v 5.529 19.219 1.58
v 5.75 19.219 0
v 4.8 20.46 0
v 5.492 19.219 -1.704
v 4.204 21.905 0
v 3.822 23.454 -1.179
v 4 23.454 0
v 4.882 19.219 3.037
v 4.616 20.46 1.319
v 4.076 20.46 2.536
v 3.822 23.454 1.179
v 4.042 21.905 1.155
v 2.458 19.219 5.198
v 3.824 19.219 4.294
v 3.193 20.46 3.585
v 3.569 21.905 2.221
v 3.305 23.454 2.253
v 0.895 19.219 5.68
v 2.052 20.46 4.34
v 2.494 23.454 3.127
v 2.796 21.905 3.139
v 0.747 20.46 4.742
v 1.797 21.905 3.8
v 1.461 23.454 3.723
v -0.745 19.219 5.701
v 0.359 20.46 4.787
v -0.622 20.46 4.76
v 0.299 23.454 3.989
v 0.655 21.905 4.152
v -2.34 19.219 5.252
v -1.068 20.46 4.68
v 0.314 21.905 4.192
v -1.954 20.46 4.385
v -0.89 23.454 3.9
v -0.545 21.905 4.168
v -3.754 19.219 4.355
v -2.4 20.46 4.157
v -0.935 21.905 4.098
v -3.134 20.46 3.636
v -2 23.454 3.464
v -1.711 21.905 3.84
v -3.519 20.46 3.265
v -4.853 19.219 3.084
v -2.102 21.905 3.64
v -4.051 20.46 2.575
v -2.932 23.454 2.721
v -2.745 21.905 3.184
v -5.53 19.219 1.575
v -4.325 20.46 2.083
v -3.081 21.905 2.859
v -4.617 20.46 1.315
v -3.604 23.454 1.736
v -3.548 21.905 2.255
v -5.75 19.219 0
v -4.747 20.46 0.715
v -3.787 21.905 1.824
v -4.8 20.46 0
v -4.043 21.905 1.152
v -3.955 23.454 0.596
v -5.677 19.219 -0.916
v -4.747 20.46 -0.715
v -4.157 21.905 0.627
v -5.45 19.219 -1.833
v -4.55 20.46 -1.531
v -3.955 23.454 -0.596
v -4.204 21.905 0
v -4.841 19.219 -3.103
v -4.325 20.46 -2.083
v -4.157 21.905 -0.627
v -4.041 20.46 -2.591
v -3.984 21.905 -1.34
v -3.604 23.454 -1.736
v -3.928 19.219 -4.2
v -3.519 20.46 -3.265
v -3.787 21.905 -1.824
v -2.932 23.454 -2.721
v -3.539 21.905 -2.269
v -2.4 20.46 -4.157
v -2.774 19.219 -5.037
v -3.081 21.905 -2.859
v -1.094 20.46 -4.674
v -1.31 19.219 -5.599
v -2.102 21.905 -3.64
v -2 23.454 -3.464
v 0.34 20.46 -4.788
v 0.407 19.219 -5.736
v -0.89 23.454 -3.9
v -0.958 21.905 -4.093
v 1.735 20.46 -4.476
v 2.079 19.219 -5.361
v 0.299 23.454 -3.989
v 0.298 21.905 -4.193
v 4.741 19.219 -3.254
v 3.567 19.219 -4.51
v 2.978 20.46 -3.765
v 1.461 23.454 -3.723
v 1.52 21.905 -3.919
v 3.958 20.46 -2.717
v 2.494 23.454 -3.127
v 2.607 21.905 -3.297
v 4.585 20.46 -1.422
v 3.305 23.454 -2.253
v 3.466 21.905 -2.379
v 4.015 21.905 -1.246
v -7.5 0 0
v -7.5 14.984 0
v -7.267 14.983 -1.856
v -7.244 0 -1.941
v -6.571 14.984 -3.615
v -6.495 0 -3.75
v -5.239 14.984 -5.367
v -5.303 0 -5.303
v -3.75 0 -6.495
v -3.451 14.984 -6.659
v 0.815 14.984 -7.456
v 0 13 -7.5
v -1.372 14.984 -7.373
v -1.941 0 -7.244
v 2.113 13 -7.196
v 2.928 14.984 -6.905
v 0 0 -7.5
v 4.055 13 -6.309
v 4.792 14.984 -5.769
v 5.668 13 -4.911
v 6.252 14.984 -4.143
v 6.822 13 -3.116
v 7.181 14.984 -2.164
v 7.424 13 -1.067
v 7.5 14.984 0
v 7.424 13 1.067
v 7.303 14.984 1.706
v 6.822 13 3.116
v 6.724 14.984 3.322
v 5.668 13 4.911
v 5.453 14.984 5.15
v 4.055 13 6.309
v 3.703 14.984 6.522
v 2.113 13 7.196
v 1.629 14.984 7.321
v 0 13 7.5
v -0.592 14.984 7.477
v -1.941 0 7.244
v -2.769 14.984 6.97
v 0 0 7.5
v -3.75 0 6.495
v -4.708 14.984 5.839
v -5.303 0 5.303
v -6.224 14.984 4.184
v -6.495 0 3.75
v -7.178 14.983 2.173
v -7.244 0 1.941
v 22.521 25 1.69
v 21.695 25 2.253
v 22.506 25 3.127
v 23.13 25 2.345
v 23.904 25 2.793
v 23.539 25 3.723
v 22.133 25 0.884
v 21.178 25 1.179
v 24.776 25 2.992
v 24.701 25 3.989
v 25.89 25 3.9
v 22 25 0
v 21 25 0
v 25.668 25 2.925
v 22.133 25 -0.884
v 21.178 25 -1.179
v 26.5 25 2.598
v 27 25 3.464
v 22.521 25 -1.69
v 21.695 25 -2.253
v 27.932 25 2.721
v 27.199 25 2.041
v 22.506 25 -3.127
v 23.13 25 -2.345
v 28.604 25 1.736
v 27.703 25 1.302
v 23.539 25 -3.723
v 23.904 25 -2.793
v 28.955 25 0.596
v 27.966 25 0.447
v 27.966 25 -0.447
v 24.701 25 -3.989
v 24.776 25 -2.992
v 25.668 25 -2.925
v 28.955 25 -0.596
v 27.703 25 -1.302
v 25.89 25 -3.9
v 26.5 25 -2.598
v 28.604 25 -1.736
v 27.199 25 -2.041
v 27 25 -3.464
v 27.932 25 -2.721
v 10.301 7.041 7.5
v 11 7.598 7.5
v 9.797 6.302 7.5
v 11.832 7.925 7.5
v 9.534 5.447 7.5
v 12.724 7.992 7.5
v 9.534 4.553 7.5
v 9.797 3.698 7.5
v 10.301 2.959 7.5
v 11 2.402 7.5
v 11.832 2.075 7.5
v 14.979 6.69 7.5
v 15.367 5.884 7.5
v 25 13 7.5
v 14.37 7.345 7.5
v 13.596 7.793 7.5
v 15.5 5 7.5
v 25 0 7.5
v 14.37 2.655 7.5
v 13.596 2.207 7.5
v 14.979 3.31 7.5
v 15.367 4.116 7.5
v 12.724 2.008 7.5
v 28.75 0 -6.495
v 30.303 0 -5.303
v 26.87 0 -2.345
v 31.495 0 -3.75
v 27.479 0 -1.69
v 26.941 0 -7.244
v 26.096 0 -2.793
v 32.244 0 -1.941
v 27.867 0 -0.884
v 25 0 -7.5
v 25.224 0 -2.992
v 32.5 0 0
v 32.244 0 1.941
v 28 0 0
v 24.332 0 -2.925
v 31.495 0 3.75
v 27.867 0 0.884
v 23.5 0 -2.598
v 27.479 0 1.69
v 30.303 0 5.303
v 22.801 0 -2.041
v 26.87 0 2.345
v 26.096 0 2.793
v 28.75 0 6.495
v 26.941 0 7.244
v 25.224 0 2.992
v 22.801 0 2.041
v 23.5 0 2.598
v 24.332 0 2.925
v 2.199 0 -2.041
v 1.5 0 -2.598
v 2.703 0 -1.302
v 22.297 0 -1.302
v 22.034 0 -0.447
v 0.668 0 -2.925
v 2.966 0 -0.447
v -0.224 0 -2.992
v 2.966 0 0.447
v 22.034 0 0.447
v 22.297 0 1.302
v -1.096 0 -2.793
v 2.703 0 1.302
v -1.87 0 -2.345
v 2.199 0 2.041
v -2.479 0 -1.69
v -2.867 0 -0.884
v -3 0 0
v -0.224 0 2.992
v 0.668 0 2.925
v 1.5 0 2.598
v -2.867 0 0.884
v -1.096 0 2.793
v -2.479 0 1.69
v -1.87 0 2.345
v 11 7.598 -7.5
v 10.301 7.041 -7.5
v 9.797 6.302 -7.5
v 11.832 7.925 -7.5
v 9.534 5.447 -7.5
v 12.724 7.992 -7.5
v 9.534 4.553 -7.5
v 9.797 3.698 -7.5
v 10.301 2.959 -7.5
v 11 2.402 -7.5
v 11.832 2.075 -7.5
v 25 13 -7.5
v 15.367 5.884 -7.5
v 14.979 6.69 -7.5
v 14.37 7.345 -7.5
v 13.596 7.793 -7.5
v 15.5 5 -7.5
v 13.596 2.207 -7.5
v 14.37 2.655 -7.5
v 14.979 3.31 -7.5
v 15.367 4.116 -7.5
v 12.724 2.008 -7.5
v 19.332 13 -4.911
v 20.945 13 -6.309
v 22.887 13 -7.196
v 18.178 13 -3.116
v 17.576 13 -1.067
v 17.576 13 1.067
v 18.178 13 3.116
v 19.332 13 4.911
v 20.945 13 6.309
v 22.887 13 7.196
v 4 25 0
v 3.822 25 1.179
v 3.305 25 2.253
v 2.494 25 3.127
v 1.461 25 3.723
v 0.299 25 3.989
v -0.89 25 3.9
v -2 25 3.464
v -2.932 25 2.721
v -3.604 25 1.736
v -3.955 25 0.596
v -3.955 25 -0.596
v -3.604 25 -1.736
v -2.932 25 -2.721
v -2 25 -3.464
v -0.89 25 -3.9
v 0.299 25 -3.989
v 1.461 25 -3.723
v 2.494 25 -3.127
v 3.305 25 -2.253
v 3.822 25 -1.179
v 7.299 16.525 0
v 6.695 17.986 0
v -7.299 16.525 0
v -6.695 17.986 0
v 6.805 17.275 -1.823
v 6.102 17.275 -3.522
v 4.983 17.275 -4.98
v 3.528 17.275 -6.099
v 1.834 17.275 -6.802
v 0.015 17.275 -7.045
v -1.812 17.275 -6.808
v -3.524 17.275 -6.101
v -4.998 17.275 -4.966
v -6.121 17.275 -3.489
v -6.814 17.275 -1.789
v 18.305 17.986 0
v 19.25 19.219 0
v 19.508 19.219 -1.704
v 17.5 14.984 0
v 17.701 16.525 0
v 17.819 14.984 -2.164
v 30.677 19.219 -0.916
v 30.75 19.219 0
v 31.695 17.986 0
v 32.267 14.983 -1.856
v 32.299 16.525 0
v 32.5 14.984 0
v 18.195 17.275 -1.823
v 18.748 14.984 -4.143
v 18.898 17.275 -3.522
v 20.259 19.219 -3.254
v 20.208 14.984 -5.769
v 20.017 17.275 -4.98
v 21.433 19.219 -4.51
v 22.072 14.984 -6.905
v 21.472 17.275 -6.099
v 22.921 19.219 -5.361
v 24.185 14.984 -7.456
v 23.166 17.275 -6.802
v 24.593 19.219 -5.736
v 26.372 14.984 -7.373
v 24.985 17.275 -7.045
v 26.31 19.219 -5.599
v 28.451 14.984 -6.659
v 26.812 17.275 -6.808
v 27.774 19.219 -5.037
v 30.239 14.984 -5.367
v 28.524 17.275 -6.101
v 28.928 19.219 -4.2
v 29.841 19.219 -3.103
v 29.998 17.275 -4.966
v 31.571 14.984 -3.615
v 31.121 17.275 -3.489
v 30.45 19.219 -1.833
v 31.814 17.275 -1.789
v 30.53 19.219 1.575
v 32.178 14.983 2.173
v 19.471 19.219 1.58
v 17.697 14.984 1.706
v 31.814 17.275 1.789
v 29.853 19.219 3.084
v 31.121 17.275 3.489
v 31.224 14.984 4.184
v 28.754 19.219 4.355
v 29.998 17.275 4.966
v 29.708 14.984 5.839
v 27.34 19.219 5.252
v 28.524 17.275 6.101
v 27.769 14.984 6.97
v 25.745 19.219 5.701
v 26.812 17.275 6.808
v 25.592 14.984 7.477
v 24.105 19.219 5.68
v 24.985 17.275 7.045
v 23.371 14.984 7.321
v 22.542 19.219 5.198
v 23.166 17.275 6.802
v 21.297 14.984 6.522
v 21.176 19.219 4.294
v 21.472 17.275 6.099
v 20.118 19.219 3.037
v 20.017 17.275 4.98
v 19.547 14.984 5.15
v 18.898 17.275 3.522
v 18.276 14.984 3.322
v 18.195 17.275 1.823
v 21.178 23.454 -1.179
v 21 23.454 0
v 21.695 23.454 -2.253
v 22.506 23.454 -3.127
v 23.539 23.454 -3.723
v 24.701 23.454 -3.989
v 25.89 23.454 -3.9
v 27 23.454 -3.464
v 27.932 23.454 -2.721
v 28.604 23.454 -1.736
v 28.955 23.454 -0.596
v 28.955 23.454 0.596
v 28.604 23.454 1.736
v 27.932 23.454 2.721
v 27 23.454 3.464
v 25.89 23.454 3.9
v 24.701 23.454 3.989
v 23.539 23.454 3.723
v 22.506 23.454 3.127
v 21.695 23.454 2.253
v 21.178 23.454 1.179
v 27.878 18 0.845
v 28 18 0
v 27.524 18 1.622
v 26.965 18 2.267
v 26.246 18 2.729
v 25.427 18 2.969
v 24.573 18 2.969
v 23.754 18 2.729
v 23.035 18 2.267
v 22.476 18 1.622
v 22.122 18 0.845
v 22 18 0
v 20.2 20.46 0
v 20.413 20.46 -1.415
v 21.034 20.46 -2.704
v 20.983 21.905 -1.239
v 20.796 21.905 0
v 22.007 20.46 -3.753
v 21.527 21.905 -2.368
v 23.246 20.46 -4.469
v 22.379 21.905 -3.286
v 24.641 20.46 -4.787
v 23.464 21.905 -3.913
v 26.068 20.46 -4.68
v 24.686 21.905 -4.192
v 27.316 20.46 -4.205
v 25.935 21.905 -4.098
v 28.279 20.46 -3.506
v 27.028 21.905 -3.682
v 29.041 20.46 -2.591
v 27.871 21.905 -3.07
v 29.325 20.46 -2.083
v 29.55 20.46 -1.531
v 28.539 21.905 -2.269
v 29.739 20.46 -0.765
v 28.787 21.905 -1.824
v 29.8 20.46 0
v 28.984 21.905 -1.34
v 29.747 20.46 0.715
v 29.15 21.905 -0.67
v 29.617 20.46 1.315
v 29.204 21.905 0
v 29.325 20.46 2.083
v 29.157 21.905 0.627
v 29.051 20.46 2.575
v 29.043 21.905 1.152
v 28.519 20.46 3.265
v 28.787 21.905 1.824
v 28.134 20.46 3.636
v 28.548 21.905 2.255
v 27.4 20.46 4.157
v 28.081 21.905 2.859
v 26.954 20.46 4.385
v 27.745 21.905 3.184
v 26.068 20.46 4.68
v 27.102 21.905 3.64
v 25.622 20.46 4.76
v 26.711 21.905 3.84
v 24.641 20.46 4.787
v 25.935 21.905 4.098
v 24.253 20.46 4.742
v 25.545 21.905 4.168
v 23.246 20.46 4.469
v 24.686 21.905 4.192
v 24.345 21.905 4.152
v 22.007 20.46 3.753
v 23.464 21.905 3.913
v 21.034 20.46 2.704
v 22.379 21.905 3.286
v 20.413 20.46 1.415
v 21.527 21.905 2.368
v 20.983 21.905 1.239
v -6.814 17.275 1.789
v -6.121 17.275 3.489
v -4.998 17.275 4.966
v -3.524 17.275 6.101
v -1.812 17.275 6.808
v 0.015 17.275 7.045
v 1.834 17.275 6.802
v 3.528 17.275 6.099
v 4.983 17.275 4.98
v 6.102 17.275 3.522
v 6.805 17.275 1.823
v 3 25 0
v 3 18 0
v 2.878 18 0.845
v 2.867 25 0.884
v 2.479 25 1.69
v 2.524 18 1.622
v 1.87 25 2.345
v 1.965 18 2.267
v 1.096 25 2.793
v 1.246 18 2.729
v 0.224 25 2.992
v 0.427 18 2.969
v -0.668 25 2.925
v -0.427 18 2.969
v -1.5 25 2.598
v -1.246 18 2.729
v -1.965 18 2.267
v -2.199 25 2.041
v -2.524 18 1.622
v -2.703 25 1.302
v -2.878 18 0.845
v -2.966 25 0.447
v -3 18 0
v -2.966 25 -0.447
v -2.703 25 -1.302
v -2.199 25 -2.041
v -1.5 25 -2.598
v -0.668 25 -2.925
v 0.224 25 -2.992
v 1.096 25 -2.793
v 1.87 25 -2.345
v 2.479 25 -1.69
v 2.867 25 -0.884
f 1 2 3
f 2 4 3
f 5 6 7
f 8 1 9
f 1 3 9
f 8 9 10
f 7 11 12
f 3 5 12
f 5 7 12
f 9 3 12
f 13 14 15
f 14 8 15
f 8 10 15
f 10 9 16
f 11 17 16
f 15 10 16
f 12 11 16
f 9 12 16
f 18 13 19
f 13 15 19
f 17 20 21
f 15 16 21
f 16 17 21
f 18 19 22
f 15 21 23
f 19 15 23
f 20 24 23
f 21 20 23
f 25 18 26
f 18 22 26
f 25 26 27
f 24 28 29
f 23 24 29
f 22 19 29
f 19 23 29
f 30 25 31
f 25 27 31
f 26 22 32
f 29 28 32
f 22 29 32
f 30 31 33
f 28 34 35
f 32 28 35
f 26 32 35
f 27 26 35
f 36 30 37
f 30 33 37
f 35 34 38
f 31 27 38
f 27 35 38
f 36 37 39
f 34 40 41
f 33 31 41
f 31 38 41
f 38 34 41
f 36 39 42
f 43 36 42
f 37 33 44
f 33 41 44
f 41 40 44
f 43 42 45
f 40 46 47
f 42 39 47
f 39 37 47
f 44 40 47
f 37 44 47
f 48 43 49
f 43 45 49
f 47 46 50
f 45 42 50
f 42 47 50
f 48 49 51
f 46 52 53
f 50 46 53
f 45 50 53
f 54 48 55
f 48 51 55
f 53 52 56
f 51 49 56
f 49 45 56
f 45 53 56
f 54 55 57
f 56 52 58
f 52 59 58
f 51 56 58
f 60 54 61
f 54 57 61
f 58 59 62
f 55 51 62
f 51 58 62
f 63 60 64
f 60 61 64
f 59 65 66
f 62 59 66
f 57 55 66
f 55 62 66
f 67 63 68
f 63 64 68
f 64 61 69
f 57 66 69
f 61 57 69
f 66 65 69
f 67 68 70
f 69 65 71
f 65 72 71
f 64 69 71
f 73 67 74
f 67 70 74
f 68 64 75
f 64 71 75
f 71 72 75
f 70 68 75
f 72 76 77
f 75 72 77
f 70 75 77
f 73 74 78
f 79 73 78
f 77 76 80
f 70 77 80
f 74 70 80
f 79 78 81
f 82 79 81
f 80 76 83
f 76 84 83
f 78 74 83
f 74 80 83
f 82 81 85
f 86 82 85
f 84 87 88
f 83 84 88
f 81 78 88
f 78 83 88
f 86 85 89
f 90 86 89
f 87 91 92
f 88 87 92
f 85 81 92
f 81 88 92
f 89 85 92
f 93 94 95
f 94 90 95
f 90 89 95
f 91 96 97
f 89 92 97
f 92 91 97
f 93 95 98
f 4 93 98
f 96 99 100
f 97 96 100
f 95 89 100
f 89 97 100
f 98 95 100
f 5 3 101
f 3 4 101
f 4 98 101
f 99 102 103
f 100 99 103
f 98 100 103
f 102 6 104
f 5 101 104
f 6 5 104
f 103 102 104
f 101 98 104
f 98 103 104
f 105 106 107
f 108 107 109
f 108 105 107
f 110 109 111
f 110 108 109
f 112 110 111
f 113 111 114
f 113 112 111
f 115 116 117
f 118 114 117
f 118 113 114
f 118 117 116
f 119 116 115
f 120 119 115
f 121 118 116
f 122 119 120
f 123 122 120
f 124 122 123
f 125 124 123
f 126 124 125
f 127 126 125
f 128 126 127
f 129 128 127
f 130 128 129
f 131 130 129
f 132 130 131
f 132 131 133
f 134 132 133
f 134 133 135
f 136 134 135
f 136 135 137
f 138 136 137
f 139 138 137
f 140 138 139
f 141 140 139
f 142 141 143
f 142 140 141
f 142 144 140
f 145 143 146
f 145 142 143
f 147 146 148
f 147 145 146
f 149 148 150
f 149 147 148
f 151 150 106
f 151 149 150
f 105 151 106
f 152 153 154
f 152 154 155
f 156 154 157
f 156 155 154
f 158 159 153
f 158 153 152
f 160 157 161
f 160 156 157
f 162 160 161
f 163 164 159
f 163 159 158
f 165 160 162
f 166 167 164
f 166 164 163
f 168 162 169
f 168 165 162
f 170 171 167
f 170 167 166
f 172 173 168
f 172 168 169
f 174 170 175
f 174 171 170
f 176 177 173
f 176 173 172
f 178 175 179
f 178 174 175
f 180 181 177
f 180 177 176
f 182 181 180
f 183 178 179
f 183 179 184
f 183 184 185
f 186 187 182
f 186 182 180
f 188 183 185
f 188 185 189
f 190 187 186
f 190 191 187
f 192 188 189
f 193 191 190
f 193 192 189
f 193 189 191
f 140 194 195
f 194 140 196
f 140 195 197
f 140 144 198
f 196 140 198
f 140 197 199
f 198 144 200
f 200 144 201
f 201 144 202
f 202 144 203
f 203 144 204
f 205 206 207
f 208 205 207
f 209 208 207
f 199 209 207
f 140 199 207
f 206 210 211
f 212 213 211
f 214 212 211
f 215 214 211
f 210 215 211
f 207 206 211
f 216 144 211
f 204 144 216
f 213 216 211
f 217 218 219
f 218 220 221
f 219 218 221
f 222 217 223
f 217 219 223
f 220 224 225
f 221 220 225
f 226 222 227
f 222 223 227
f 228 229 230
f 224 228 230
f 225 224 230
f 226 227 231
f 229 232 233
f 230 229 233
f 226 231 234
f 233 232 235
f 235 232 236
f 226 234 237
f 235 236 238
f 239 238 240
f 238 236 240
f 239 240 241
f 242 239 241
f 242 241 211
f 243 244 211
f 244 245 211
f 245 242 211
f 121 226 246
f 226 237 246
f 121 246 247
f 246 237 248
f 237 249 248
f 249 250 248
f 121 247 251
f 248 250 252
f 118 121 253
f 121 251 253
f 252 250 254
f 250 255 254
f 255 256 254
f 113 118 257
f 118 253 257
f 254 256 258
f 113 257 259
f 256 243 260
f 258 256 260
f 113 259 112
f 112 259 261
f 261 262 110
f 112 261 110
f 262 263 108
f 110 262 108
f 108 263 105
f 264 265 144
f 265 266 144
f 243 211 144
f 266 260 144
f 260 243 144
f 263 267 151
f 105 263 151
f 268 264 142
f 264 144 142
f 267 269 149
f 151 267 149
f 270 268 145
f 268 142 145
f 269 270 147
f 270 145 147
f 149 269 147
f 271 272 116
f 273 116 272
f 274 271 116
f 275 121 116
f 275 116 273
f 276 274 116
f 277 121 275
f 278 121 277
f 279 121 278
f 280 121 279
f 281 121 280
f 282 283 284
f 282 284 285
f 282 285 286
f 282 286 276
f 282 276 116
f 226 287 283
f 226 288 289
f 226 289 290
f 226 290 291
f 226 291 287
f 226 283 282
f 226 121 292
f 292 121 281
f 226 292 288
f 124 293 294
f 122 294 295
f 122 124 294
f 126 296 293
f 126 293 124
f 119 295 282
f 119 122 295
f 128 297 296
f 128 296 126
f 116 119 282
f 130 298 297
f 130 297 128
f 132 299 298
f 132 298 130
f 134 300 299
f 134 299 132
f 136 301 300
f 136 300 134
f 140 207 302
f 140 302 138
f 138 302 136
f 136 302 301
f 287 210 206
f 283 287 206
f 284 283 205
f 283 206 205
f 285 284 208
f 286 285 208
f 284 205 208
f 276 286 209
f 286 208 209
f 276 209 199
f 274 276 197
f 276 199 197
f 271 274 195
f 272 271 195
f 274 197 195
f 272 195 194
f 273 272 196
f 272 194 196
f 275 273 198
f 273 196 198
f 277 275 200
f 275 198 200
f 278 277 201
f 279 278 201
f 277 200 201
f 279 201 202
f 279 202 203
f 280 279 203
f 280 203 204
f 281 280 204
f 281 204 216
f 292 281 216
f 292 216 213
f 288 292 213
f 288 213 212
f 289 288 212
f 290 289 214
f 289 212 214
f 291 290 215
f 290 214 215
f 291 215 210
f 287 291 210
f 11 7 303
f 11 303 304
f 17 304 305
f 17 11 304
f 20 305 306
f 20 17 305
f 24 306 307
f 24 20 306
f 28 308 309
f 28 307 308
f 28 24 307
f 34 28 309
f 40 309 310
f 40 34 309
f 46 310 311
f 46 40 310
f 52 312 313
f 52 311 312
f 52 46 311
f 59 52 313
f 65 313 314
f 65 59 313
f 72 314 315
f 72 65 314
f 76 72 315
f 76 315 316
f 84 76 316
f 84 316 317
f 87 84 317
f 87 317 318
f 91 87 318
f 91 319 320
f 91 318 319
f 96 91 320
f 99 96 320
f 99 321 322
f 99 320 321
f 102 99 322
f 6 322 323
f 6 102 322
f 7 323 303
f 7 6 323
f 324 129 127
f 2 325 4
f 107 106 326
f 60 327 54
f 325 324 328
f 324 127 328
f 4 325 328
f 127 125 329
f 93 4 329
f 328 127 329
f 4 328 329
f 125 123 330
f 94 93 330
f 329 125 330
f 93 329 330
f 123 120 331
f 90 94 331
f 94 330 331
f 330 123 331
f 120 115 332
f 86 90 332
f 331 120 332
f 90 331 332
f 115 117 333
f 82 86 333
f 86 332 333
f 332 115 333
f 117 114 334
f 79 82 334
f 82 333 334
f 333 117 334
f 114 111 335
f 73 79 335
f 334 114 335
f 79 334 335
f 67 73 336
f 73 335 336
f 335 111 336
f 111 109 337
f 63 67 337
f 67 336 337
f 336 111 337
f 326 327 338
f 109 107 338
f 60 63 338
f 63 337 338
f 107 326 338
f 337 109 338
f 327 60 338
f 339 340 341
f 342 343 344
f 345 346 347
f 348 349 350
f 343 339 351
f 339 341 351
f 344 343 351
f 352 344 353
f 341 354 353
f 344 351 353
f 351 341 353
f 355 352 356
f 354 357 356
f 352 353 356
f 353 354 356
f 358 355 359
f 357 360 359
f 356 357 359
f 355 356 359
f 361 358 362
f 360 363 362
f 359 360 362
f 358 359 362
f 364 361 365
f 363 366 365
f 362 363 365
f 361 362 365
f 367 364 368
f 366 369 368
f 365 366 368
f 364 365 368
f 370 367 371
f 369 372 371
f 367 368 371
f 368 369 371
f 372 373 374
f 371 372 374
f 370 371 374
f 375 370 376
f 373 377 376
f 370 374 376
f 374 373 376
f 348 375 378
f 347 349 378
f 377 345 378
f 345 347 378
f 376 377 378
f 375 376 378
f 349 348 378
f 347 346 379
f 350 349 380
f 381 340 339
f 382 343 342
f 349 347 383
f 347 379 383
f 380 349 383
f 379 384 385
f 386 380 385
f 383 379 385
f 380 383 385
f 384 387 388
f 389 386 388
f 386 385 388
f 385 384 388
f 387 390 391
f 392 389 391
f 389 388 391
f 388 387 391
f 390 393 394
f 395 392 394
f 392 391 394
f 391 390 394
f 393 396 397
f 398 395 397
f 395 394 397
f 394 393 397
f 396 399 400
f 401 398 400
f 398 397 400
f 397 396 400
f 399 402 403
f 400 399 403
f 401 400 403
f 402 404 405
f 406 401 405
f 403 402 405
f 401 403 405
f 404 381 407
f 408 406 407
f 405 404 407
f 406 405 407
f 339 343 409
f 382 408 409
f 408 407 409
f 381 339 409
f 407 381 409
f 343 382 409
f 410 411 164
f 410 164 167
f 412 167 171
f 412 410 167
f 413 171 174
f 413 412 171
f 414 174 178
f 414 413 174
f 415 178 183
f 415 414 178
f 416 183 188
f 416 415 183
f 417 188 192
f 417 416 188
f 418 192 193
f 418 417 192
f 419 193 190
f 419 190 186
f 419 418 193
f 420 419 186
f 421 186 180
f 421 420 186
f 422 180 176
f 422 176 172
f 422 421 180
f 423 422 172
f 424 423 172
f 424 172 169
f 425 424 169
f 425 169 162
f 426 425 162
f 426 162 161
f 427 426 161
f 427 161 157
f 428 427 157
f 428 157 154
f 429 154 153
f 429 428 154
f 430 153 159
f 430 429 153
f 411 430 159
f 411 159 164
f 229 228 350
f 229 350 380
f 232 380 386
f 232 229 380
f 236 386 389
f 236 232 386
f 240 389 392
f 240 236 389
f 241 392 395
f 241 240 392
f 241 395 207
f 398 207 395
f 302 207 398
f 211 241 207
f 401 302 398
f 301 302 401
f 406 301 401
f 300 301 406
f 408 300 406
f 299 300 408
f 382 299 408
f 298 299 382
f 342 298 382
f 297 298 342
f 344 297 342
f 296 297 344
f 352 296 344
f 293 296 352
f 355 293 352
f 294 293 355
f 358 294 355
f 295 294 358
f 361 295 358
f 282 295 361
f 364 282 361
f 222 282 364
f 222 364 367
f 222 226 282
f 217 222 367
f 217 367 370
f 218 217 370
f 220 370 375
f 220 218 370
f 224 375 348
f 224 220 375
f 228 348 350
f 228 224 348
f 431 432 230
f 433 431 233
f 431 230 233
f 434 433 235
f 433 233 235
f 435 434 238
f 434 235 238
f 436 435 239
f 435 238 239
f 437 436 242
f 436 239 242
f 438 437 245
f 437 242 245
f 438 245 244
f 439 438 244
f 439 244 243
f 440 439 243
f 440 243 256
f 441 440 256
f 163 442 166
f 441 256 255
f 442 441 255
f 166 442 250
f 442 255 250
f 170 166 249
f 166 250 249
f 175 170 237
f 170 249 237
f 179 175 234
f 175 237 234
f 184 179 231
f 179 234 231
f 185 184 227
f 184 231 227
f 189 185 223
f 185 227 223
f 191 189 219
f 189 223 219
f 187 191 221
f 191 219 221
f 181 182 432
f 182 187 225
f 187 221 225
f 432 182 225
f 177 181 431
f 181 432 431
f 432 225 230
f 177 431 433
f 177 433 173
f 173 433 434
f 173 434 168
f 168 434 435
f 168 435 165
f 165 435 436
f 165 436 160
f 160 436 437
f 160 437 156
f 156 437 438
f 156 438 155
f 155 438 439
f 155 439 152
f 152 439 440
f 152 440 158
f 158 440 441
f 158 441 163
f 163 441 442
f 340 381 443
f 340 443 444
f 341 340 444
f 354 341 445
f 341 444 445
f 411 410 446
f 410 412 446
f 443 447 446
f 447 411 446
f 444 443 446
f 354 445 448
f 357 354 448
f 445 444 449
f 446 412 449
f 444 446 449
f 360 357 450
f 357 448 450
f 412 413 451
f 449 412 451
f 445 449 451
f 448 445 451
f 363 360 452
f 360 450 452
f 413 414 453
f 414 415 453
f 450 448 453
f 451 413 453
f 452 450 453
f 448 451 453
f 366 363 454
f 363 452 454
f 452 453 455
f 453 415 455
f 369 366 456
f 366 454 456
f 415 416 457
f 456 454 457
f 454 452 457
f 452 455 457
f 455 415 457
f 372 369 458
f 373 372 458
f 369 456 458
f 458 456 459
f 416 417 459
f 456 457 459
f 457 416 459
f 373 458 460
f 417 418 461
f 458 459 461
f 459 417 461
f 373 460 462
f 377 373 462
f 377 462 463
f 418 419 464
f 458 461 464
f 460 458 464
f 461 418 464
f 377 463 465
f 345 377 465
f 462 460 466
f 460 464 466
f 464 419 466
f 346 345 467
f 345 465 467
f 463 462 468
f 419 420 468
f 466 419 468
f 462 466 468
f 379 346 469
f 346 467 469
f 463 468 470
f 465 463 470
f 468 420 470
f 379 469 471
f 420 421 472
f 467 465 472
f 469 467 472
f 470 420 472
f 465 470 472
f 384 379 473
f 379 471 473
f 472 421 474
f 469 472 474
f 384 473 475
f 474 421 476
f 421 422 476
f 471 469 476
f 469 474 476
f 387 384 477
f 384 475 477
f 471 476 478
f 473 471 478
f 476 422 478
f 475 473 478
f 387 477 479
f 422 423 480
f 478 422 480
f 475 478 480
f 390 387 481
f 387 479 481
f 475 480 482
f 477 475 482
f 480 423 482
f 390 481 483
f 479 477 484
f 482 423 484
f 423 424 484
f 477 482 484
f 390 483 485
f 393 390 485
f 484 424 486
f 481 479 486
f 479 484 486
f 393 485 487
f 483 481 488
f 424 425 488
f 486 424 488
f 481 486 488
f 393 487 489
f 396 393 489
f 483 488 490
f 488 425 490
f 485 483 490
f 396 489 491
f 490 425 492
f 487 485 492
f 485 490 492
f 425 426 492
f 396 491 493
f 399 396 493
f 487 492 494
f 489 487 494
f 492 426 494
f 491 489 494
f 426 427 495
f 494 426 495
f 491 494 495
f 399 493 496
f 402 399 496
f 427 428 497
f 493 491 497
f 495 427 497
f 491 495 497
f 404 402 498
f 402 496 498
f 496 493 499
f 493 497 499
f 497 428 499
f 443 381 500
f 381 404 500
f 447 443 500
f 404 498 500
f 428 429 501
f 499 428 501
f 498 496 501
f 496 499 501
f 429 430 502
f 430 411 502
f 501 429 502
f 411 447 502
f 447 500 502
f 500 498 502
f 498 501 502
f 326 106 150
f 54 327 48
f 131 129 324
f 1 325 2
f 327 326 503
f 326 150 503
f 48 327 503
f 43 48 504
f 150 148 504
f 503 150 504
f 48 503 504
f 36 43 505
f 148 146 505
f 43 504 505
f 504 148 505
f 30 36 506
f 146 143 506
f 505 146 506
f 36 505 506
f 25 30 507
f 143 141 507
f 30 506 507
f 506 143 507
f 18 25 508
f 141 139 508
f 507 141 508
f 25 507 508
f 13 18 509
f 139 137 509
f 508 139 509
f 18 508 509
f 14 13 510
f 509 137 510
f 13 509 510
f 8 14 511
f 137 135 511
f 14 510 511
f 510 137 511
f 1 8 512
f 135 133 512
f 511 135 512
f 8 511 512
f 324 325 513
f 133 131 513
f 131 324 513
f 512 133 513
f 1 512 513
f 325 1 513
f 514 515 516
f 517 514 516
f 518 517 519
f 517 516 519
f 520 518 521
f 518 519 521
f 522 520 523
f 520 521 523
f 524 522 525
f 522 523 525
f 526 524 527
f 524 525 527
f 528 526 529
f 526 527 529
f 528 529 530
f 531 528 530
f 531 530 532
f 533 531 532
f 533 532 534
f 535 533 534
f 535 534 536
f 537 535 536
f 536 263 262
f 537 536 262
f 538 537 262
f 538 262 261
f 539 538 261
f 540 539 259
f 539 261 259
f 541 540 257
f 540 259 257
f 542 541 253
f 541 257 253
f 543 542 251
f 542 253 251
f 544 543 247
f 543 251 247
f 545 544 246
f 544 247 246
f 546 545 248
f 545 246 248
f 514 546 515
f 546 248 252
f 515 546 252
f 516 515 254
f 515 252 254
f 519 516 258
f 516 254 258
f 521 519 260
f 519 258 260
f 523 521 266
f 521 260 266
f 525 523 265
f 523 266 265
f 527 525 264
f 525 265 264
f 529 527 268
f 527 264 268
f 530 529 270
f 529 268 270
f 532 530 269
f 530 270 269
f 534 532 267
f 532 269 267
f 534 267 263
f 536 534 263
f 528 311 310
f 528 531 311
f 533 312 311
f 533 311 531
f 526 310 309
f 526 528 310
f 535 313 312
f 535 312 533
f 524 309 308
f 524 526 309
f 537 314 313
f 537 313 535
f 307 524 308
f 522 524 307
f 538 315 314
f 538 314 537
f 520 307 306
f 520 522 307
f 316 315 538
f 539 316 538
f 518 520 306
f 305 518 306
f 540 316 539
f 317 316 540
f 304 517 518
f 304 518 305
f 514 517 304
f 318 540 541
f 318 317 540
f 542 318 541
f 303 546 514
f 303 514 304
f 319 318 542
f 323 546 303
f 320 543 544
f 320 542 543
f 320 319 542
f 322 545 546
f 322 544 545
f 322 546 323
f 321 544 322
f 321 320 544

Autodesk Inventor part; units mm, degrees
ref_plane "XZ Plane" through (0, 0, 0) normal (0, 1, 0) x (-1, 0, 0)
ref_plane "XY Plane" through (0, 0, 0) normal (0, 0, 1) x (1, 0, 0)
sketch "Sketch1" plane through (0, 0, 0) normal (0, 1, 0) x (-1, 0, 0)
  circle A0 centre (0, 0) radius 7.5
  circle A1 centre (0, 0) radius 3
  dimension "d0" = 15
  dimension "d1" = 6
extrude "Extrusion1" add sketch "Sketch1" along normal blind 18
sketch "Sketch2" plane through (0, 18, 0) normal (0, 1, 0) x (1, 0, 0)
  circle A0 centre (0, 0) radius 3 projected
  circle A1 centre (0, 0) radius 2.75
  circle A2 centre (0, 0) radius 4
  dimension "d4" = 5.5
  dimension "d5" = 8
extrude "Extrusion2" add sketch "Sketch2" along normal blind 7 contours A2
fillet "Fillet1" radius 6 1 edges at (-4, 18, 0)
fillet "Fillet2" radius 6 2 edges at (0, 18, -7.5) (0, 18, 7.5)
ref_plane "Work Plane1" through (12.5, 0, 0) normal (1, 0, 0) x (0, 1, 0)
mirror "Mirror1" about plane through (12.5, 0, 0) normal (1, 0, 0) of "Extrusion1", "Extrusion2", "Fillet1", "Fillet2"
sketch "Sketch3" plane through (0, 0, 0) normal (0, 1, 0) x (-1, 0, 0)
  circle A0 centre (-25, 0) radius 3 projected
  line L0 (-25, 0) -> (-25, 3)
  line L1 (-25, 0) -> (-25, -3)
  line L2 (0, 0) -> (0, -3)
  circle A1 centre (0, 0) radius 3 projected
  line L3 (0, 0) -> (0, 3)
  line L4 (-25, 3) -> (0, 3)
  line L5 (0, 3) -> (0, 7.5)
  line L6 (0, 7.5) -> (-25, 7.5)
  line L7 (-25, 7.5) -> (-25, 3)
  line L8 (-25, -3) -> (0, -3)
  line L9 (0, -3) -> (0, -7.5)
  line L10 (0, -7.5) -> (-25, -7.5)
  line L11 (-25, -7.5) -> (-25, -3)
  point P0 (0, -3)
  point P1 (0, 3)
  dimension "d11" = 25
  dimension "d12" = 4.5
  dimension "d13" = 25
  dimension "d14" = 4.5
extrude "Extrusion3" add sketch "Sketch3" along normal blind 13 contours A0 L4 A1 L8 | L7 L6 L5 L4 | L8 L9 L10 L11
sketch "Sketch4" plane through (0, 0, 7.5) normal (0, 0, 1) x (1, 0, 0)
  line L0 (25, 13) -> (0, 13) projected
  circle A0 centre (12.5, 5) radius 3
  line L1 (0, 0) -> (25, 0) projected
  line L2 (0, 0) -> (0, 13) projected
  point P0 (25, 15)
  point P1 (0, 15)
  dimension "d18" = 6
  dimension "d21" = 5
  dimension "d22" = 12.5
extrude "Extrusion4" cut sketch "Sketch4" against normal through all
properties part number "4mm_Roller_Spacer_extended"
